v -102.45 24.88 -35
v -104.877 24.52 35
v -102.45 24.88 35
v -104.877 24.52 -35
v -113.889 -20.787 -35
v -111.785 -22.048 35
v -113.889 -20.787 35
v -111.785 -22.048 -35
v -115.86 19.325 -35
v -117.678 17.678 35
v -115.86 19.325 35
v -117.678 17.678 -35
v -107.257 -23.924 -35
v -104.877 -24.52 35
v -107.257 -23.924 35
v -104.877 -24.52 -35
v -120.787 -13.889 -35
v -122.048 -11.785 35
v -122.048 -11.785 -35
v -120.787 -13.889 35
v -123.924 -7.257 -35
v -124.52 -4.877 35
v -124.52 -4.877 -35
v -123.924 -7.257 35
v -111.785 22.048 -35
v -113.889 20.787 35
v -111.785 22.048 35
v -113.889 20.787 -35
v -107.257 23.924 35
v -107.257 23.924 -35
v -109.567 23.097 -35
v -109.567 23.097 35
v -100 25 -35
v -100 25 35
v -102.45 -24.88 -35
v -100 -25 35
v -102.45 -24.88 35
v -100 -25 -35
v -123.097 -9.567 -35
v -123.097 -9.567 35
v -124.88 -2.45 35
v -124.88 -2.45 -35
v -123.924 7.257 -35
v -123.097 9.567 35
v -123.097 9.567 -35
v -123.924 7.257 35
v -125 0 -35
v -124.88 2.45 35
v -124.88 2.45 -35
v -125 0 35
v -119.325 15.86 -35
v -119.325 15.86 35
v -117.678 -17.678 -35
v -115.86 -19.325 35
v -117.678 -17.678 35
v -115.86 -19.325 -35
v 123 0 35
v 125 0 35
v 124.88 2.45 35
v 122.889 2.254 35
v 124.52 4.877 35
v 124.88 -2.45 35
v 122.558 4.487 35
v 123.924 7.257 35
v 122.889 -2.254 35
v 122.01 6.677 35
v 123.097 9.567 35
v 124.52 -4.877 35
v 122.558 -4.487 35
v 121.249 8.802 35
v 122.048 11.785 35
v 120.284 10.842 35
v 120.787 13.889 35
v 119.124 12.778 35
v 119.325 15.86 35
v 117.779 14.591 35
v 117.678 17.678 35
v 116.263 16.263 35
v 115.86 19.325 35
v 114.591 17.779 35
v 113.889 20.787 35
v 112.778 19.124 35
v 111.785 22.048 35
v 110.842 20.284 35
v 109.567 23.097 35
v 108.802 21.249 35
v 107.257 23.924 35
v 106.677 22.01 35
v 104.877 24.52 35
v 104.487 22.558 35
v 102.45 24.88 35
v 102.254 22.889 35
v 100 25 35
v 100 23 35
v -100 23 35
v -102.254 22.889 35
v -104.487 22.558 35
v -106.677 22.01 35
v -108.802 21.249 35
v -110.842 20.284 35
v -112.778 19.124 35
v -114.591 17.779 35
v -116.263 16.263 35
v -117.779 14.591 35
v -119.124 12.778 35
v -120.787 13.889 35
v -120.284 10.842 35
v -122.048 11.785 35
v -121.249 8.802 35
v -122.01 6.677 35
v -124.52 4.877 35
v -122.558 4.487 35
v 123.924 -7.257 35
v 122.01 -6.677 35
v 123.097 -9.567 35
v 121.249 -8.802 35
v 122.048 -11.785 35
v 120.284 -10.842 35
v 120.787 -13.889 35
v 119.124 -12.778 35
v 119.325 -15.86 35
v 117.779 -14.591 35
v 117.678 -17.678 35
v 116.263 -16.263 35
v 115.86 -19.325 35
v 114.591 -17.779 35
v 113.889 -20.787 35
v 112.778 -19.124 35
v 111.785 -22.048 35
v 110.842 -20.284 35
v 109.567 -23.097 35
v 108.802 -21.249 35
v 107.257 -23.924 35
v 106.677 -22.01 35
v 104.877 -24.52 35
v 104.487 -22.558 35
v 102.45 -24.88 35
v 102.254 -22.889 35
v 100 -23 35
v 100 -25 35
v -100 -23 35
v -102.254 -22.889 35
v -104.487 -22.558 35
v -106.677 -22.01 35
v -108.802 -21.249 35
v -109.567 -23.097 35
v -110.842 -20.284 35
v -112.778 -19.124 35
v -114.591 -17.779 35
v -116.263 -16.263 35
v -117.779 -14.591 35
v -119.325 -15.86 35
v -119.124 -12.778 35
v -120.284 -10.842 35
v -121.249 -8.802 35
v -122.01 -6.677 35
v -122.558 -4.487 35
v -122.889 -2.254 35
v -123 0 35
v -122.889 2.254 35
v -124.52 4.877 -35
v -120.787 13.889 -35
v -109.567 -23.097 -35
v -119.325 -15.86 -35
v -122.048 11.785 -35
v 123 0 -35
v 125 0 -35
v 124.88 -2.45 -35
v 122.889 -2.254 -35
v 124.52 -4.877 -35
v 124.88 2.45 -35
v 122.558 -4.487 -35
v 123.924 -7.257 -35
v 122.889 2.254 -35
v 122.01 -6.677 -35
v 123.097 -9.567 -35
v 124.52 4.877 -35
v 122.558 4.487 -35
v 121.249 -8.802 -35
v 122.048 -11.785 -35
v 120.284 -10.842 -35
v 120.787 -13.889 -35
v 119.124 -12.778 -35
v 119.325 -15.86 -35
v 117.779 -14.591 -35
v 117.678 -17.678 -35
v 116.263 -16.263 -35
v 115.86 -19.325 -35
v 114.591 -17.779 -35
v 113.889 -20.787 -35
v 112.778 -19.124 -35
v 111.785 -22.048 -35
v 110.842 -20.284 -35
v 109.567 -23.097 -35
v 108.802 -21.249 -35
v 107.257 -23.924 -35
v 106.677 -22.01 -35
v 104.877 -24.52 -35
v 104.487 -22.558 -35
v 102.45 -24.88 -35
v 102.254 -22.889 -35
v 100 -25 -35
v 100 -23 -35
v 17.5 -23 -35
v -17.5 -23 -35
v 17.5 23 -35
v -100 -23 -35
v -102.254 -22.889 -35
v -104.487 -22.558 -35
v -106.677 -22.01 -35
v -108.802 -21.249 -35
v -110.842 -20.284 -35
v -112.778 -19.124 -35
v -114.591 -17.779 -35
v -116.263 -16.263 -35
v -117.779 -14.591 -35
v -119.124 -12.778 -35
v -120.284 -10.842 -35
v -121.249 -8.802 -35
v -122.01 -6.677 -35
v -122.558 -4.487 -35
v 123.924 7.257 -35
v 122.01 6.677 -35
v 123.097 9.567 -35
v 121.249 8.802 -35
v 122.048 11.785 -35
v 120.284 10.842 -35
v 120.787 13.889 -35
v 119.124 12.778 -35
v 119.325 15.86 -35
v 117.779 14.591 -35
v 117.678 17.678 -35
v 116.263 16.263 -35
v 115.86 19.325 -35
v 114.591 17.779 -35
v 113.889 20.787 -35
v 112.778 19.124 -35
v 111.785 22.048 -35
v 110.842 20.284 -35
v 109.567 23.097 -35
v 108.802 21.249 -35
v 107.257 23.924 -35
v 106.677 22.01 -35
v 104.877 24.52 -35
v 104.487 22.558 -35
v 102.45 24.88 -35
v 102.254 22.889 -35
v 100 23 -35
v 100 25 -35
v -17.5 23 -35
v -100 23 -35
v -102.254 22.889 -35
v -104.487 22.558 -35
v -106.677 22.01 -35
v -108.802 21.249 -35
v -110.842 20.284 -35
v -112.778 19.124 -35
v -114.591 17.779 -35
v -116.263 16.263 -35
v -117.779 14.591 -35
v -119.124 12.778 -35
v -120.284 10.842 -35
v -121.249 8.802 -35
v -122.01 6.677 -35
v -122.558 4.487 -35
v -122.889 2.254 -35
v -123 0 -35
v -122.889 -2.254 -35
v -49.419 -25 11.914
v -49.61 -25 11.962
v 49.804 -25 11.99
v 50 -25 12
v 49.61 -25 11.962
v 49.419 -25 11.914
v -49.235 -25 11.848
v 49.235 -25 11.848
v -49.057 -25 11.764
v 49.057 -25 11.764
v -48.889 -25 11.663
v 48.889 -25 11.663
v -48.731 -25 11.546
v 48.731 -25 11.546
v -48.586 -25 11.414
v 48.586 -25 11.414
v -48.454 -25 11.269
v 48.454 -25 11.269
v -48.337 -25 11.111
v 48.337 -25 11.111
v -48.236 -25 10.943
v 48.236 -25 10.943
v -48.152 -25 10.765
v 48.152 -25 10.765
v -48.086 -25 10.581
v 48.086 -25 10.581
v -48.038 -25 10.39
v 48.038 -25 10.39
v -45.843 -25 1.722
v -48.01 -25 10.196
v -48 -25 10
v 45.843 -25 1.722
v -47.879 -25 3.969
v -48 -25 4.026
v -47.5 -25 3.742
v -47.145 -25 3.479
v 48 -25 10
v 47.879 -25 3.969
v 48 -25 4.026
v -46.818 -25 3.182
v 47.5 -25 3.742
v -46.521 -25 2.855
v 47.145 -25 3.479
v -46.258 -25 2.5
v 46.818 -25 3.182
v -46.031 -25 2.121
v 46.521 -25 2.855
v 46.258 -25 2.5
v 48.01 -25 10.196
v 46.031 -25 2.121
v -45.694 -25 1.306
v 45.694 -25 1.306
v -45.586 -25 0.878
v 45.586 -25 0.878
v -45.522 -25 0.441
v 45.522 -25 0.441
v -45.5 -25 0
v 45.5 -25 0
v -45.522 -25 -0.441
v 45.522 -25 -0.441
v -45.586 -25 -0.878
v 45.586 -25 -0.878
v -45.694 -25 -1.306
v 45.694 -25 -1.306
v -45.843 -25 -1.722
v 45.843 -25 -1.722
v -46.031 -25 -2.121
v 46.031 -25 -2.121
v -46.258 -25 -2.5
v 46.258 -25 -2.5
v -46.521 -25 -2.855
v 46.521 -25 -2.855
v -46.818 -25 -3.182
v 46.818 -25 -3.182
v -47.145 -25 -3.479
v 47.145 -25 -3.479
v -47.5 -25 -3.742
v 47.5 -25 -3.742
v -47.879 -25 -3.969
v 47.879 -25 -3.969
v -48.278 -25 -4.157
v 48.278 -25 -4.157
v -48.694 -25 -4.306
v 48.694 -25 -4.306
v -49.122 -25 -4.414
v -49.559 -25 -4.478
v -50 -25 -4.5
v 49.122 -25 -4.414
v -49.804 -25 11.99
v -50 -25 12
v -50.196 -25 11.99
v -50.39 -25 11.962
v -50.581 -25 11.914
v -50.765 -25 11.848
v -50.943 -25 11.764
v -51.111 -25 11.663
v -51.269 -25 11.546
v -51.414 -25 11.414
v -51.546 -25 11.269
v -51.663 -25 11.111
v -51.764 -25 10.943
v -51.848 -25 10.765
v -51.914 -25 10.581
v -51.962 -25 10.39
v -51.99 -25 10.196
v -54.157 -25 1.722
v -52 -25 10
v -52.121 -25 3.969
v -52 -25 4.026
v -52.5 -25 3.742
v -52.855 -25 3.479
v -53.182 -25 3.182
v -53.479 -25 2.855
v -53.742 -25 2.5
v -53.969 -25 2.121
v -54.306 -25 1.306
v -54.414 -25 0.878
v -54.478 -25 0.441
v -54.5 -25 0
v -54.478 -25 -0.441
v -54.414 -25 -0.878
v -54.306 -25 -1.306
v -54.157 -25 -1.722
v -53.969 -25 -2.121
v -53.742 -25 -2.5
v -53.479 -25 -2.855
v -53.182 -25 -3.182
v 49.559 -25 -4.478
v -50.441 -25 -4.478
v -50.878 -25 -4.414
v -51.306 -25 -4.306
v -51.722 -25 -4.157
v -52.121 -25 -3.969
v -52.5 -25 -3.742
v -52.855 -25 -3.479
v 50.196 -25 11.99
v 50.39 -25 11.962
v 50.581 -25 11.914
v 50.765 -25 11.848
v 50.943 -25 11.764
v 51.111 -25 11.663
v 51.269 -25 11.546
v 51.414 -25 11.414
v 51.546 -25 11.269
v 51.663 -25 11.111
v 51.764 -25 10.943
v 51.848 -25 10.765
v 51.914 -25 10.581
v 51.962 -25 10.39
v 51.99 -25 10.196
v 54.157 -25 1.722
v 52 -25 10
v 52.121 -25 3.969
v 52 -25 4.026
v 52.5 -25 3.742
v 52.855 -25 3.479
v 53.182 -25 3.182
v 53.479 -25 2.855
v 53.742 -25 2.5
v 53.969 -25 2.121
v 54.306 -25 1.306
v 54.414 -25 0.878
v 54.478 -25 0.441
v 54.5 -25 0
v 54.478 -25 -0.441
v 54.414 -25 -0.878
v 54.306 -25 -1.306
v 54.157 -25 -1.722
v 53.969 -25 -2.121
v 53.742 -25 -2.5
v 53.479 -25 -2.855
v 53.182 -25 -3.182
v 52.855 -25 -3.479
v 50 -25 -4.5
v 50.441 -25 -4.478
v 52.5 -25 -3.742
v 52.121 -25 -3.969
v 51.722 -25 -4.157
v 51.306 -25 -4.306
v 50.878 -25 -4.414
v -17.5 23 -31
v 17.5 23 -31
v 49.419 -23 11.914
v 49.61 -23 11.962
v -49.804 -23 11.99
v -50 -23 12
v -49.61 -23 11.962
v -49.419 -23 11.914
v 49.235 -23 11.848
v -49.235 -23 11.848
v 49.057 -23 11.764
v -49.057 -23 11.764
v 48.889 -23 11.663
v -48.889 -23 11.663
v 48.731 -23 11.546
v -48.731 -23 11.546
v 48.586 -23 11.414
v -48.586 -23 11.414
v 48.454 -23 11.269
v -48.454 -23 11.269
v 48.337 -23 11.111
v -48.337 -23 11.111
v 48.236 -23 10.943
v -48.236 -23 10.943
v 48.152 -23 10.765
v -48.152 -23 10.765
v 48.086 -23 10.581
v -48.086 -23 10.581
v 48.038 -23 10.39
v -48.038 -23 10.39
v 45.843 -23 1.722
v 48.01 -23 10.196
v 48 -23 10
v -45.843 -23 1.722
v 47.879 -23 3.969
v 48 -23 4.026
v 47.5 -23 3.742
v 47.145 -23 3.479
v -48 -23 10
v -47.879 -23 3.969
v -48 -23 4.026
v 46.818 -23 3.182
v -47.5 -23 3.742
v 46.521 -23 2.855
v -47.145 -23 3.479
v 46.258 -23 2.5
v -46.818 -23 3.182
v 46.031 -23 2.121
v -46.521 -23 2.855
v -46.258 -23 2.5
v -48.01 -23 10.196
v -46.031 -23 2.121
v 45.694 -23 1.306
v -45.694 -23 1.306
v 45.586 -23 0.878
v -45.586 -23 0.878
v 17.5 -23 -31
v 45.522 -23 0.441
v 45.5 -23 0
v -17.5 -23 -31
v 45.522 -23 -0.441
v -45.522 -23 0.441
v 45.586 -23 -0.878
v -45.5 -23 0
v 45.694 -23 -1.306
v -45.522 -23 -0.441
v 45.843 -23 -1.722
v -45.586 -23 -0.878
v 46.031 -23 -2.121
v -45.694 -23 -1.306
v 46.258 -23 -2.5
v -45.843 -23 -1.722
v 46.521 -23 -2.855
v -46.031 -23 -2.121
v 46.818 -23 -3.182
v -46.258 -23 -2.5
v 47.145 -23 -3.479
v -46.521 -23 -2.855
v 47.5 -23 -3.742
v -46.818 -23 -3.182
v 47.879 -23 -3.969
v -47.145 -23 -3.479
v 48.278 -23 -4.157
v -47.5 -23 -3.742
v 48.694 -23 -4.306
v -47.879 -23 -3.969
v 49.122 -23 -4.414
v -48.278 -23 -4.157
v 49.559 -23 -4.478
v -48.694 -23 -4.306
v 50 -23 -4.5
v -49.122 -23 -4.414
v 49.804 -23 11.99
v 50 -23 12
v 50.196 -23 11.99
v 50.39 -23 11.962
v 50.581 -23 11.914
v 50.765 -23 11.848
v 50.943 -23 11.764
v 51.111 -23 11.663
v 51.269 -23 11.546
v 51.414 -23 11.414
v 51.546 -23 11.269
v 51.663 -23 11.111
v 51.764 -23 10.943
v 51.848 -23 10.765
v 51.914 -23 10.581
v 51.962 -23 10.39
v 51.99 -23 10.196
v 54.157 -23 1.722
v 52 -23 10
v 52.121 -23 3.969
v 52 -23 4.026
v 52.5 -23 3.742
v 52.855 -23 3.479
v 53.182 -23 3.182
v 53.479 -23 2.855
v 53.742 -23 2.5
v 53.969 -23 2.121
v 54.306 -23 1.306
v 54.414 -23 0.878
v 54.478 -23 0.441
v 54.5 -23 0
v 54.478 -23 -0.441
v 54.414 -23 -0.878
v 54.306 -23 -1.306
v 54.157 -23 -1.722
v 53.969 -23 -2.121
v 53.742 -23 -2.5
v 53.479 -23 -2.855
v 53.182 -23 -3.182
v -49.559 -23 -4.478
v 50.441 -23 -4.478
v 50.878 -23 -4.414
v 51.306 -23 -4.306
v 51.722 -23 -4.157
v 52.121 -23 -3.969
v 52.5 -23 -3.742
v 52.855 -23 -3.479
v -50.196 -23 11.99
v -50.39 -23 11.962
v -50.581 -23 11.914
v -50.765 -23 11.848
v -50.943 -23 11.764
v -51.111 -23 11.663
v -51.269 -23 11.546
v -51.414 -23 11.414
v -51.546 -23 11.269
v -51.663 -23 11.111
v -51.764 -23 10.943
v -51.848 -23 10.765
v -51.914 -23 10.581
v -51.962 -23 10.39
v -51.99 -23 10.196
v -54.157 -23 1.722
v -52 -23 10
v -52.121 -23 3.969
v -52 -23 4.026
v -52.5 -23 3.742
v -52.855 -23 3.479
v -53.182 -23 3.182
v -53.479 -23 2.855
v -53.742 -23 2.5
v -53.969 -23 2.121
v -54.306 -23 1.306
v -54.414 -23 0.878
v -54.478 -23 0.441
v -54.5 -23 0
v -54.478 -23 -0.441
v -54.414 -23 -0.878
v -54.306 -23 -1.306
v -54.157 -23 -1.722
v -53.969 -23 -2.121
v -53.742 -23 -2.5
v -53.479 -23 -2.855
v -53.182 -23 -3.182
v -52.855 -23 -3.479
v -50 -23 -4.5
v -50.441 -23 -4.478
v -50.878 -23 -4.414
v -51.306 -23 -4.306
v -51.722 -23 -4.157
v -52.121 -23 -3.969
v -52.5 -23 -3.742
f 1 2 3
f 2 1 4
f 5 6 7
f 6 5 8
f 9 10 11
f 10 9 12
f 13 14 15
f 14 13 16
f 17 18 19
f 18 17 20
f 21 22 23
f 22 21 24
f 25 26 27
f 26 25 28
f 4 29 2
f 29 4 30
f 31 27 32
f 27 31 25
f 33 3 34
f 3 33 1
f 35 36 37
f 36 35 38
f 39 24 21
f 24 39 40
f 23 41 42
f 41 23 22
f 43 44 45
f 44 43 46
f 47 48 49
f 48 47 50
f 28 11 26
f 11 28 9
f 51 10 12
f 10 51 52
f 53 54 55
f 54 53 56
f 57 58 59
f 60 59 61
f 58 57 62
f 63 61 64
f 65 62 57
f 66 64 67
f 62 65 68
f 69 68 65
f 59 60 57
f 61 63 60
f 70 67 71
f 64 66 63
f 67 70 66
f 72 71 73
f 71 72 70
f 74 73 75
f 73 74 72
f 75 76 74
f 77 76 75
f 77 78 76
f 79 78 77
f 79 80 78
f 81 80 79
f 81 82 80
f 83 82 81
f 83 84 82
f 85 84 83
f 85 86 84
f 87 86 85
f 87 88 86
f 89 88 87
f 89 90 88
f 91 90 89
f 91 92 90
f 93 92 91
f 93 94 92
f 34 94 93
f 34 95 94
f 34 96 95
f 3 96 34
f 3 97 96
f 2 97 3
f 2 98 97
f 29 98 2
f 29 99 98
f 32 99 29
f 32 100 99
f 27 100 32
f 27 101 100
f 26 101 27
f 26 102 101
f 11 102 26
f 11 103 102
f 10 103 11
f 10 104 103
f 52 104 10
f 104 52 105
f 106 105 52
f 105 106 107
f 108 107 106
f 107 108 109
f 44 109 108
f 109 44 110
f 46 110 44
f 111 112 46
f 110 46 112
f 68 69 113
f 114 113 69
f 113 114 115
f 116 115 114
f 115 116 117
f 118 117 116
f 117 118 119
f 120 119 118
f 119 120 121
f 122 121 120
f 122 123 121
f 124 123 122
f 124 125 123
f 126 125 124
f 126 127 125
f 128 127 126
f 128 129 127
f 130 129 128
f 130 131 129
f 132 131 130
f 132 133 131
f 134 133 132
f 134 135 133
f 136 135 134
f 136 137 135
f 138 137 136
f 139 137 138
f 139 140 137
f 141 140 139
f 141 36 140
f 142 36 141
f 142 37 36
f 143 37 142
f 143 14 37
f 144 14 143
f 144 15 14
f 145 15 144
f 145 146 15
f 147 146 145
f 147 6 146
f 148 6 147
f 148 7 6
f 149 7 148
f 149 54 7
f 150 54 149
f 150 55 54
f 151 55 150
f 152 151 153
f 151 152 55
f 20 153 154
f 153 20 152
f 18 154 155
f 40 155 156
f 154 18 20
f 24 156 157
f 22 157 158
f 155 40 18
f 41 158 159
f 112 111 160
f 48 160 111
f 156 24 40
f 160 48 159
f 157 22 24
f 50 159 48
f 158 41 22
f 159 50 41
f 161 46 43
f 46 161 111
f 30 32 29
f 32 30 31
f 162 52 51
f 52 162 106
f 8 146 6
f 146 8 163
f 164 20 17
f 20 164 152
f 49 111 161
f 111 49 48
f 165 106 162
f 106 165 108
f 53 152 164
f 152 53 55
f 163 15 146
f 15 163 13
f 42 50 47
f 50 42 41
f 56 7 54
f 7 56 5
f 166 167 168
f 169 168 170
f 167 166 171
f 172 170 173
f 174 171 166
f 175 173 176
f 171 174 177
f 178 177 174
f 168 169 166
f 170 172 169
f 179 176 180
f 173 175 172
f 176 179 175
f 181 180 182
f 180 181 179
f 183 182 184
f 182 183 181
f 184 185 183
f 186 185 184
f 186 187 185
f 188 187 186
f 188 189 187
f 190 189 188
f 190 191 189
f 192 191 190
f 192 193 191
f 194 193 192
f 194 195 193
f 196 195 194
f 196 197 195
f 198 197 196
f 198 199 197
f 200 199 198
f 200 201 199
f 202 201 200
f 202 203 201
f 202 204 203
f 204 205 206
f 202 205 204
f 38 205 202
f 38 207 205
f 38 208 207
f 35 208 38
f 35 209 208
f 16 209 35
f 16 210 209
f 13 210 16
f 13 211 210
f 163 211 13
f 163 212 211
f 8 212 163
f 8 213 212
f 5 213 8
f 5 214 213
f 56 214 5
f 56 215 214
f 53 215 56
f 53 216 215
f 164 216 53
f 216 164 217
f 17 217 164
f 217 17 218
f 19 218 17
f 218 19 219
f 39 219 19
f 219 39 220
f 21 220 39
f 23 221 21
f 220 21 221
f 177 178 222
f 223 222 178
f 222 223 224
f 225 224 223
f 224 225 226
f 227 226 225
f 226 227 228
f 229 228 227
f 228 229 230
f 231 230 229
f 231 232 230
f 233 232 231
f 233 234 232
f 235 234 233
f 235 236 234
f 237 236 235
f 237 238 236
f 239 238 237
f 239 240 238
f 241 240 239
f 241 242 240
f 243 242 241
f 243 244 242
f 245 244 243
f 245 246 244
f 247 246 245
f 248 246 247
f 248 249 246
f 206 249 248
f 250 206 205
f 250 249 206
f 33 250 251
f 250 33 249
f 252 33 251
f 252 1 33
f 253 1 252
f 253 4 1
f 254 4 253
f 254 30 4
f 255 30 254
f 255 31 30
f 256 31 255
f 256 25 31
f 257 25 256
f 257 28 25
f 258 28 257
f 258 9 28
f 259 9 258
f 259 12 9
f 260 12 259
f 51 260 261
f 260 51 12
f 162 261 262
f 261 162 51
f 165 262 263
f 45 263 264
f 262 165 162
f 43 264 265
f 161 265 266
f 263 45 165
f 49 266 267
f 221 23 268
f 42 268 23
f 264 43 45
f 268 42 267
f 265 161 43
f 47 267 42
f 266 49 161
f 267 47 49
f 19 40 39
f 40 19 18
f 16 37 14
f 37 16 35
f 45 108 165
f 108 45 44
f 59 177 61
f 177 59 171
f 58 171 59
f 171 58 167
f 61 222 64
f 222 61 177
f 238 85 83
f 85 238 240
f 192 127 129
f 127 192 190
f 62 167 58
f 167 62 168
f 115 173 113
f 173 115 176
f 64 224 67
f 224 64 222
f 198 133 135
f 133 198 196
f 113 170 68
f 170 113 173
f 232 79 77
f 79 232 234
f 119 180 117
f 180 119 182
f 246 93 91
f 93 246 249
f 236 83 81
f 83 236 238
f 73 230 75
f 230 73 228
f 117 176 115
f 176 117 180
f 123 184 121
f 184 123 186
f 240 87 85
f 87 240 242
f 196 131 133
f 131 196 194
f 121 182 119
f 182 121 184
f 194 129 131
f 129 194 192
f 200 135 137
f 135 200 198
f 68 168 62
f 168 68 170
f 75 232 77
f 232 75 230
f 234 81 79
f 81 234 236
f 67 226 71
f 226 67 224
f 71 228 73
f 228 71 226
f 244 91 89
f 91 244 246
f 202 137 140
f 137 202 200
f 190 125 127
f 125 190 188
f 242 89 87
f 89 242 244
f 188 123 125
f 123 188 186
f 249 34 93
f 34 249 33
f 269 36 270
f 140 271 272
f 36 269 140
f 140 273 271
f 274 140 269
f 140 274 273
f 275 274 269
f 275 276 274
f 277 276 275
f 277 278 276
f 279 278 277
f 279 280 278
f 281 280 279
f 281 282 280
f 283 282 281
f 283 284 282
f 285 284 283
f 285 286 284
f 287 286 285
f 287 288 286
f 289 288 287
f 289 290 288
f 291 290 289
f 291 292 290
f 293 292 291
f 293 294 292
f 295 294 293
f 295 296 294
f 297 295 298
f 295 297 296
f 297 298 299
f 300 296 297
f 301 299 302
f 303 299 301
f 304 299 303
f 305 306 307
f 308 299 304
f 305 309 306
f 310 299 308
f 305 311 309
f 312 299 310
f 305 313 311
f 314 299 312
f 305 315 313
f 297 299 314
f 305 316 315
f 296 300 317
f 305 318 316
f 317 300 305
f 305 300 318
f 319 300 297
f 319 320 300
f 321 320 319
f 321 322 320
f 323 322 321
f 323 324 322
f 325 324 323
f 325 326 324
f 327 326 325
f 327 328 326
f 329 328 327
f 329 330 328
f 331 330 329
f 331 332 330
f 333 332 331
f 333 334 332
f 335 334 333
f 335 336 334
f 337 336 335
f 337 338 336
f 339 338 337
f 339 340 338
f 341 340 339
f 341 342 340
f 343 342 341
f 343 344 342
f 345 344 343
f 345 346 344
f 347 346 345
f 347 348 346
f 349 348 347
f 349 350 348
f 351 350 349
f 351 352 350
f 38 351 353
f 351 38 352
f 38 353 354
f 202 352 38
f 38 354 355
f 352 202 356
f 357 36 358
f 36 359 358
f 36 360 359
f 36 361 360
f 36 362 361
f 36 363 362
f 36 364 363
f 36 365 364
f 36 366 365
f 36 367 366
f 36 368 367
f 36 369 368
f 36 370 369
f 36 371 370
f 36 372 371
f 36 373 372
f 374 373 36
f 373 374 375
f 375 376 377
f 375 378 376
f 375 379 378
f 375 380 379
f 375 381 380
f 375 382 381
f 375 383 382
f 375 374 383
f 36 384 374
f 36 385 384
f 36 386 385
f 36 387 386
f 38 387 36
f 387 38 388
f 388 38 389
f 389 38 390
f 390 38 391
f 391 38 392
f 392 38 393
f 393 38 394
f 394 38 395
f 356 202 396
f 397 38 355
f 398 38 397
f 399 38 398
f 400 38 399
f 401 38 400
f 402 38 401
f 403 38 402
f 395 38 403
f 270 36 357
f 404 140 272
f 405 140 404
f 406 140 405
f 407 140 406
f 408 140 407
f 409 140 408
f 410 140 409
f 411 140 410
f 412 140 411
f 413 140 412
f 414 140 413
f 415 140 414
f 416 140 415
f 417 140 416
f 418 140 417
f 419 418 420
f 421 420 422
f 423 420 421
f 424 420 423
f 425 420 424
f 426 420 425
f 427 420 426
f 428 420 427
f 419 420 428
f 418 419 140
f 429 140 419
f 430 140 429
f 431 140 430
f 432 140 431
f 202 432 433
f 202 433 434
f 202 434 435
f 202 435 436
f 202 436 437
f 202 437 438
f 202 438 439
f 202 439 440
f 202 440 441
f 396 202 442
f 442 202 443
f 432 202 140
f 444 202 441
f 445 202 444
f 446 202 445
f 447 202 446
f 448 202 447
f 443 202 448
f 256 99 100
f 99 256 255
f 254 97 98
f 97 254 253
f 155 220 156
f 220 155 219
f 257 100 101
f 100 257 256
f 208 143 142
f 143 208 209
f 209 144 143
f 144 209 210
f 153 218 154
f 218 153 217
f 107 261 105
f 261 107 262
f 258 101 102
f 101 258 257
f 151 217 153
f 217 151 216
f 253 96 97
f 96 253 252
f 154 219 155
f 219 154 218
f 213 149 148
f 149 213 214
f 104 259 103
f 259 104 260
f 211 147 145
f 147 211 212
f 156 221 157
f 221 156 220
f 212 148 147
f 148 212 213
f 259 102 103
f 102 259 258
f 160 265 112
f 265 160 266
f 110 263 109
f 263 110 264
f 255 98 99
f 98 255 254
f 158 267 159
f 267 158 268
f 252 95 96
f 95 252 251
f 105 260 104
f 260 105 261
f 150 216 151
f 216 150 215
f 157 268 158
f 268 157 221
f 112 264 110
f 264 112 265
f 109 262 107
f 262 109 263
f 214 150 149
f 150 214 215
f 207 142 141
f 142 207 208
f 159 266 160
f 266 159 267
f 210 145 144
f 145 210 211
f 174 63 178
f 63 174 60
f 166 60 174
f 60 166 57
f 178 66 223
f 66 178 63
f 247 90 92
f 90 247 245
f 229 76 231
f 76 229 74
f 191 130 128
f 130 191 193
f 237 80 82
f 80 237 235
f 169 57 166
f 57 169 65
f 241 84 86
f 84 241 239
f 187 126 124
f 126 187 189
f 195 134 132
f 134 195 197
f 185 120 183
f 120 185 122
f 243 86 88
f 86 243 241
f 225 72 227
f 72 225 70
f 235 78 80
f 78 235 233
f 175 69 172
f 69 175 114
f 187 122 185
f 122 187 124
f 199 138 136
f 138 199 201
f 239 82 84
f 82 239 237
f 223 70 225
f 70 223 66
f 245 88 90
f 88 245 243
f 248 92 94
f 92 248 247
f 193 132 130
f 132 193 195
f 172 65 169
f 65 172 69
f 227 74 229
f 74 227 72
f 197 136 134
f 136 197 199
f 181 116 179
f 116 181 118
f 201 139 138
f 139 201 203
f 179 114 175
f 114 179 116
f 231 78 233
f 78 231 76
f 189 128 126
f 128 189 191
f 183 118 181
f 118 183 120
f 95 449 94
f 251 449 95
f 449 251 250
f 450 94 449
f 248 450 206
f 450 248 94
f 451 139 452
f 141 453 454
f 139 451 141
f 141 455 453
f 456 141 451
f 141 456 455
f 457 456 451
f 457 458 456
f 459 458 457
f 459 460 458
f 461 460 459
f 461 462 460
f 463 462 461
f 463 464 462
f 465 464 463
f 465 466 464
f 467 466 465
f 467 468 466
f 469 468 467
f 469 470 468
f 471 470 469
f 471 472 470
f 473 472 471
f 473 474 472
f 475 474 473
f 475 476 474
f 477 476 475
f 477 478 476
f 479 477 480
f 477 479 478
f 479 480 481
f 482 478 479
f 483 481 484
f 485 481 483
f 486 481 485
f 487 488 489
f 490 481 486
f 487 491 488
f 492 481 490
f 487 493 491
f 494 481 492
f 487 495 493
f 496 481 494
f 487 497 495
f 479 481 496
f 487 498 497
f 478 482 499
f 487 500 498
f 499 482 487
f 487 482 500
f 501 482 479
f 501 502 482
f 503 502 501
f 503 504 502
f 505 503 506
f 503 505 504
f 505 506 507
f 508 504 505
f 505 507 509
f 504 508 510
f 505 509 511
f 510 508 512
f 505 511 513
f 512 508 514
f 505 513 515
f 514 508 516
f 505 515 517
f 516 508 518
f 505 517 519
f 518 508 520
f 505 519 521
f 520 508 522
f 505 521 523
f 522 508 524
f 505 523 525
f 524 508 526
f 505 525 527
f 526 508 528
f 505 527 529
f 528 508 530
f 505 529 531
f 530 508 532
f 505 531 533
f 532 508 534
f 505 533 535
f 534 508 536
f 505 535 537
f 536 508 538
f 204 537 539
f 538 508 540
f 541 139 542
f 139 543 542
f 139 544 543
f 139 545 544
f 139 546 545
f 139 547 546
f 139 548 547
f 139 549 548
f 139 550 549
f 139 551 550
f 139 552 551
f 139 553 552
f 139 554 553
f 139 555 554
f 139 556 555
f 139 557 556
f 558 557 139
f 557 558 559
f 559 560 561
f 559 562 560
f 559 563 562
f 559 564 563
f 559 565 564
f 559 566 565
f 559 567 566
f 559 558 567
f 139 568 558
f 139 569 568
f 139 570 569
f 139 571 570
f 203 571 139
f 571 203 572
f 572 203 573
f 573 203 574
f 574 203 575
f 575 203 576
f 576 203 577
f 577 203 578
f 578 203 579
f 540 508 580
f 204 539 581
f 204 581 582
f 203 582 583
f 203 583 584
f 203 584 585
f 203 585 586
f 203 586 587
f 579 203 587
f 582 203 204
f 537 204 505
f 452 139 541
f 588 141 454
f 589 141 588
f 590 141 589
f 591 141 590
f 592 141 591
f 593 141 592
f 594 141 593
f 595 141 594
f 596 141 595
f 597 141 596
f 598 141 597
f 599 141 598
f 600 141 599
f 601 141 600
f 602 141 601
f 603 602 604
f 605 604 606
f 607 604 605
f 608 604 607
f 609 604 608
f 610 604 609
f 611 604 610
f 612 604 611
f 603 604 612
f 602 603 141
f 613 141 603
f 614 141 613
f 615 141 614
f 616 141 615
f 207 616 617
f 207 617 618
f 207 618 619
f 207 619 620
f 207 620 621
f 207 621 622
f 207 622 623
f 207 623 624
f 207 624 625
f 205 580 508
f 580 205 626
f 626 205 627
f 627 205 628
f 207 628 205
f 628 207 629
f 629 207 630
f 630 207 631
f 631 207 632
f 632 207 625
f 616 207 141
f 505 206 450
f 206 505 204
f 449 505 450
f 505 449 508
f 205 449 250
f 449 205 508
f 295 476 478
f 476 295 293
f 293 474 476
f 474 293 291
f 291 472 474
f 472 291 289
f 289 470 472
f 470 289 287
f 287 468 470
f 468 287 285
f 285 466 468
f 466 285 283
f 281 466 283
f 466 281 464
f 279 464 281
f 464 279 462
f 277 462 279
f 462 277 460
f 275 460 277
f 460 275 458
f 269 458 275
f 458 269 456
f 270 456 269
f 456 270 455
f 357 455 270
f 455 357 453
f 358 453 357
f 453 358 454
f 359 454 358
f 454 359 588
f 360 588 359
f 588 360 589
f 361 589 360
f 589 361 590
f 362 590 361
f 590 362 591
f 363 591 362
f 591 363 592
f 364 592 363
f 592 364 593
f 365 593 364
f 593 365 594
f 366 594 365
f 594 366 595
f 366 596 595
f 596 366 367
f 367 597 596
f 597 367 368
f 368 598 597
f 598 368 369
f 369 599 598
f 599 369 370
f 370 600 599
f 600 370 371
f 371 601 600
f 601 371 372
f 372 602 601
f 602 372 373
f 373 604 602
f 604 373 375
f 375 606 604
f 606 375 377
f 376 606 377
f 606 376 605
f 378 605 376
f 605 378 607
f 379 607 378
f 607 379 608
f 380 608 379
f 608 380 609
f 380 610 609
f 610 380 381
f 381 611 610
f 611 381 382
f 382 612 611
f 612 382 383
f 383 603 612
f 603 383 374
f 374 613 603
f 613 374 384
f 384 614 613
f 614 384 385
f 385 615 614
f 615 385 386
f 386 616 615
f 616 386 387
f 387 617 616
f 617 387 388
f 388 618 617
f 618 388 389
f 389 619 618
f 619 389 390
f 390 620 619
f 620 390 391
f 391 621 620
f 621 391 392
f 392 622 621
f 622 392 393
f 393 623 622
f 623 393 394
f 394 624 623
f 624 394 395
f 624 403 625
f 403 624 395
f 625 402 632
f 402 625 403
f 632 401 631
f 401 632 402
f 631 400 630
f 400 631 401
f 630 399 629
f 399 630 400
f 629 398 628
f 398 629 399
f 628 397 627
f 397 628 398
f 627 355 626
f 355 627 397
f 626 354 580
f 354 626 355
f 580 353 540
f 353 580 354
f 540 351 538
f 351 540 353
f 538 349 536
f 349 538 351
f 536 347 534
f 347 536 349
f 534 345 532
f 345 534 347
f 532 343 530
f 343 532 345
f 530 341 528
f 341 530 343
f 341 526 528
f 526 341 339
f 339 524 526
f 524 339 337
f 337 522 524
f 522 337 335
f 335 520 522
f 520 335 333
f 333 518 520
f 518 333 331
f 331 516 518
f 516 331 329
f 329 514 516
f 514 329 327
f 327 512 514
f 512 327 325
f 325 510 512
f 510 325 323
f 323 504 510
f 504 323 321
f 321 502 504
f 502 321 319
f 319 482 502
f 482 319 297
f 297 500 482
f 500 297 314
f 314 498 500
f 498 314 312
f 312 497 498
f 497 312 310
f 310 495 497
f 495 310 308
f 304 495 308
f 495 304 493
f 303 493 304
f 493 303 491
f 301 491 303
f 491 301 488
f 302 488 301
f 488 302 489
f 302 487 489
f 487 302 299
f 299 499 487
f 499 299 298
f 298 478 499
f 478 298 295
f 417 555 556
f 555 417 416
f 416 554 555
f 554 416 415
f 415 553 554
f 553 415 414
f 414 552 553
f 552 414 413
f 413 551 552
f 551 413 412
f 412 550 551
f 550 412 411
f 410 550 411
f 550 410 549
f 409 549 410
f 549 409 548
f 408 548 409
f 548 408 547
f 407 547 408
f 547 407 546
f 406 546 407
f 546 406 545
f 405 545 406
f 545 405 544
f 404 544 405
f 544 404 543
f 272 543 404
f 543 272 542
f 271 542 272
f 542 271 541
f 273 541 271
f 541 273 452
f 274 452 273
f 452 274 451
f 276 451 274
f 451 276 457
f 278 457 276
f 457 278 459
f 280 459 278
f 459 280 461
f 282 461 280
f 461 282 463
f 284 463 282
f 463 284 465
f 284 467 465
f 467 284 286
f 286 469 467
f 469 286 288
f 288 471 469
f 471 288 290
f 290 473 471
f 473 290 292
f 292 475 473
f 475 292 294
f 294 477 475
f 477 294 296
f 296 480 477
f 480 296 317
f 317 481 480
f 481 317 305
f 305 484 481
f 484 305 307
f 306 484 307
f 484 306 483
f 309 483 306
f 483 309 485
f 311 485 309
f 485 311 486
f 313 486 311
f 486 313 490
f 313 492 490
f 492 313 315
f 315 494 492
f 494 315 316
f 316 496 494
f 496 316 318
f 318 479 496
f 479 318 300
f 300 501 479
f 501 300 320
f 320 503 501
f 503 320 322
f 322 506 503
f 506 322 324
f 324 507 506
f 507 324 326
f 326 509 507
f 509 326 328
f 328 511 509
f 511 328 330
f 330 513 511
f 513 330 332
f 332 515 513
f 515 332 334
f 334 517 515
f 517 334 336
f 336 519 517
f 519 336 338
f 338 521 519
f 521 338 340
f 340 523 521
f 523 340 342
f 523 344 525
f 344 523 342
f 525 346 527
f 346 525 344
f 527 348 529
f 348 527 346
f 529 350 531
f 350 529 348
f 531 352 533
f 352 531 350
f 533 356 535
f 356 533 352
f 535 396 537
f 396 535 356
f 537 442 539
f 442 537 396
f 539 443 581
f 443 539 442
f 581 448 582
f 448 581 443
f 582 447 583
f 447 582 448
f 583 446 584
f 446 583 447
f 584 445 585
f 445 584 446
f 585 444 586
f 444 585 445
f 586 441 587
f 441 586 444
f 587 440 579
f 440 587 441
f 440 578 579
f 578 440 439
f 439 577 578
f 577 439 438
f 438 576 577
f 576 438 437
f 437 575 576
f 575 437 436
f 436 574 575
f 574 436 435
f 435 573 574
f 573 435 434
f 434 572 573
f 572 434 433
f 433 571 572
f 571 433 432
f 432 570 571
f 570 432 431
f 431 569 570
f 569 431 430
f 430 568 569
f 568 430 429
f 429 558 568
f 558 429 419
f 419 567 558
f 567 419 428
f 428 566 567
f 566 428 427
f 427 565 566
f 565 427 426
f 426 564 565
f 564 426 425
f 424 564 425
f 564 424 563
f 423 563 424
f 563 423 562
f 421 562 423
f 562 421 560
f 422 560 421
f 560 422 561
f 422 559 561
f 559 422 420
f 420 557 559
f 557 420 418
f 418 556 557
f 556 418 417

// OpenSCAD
// Shoe Holder Design
// - Hollow rectangular cylinder: 200mm x 100mm x 70mm
// - Wall thickness: 4mm
// - Sliding hole for screw: 5mm diameter expanding to 2mm shank hole

$fn = 64; // smoother circles globally

// Parameters
outer_length = 200;
outer_width = 50;
outer_radius =  25;

total_length = outer_length + 2 * outer_radius;

outer_height = 70;
wall_thickness = 4.0;
bridge_width = 35;

// Screw hole parameters
screw_head_diameter = 5;
screw_shank_diameter = 2;
hole_depth = wall_thickness + 1; // Extra depth for sliding


module body_outside() {
    union() {
        translate([-outer_length / 2, 0, -outer_height/2]) cylinder(h=outer_height, r=outer_radius);
        translate([outer_length / 2, 0, -outer_height/2]) cylinder(h=outer_height, r=outer_radius);
        cube([outer_length, outer_width, outer_height], center = true);
    }
}

module body_inside() {
    union() {
        translate([-outer_length / 2, 0, -outer_height/2]) cylinder(h=outer_height, r=outer_radius - wall_thickness / 2);
        translate([outer_length / 2, 0, -outer_height/2]) cylinder(h=outer_height, r=outer_radius  - wall_thickness / 2);
        cube([outer_length, outer_width - wall_thickness, outer_height], center = true);
    }
}

module bridge() {
    translate([0, 0, -outer_height/2 + wall_thickness / 2]) cube([bridge_width, outer_width, wall_thickness], center=true);
}

module body() {
    union() {
        difference() {
            body_outside();
            body_inside();
        }
        bridge();
    }
}

module screw_hole(head_diameter, shank_diameter, offset) {
    union() {
        // use diameter parameter for circle; add missing semicolon
        circle(d=head_diameter);
        translate([offset, 0]) circle(d=shank_diameter);
        // Bridge the gap with a cube
        translate([0, -shank_diameter / 2]) square([offset, shank_diameter]);
    }
}

module Z_screw_hole() {
    rotate([0, -90, 90]) linear_extrude(outer_width) {
        screw_hole(9, 4, 10);
    };
}

difference() {
    body();
    color([0, 1, 0]) union() {
        translate([-outer_length / 4, 0, 0]) Z_screw_hole();
        translate([outer_length / 4, 0, 0]) Z_screw_hole();
    };
}
